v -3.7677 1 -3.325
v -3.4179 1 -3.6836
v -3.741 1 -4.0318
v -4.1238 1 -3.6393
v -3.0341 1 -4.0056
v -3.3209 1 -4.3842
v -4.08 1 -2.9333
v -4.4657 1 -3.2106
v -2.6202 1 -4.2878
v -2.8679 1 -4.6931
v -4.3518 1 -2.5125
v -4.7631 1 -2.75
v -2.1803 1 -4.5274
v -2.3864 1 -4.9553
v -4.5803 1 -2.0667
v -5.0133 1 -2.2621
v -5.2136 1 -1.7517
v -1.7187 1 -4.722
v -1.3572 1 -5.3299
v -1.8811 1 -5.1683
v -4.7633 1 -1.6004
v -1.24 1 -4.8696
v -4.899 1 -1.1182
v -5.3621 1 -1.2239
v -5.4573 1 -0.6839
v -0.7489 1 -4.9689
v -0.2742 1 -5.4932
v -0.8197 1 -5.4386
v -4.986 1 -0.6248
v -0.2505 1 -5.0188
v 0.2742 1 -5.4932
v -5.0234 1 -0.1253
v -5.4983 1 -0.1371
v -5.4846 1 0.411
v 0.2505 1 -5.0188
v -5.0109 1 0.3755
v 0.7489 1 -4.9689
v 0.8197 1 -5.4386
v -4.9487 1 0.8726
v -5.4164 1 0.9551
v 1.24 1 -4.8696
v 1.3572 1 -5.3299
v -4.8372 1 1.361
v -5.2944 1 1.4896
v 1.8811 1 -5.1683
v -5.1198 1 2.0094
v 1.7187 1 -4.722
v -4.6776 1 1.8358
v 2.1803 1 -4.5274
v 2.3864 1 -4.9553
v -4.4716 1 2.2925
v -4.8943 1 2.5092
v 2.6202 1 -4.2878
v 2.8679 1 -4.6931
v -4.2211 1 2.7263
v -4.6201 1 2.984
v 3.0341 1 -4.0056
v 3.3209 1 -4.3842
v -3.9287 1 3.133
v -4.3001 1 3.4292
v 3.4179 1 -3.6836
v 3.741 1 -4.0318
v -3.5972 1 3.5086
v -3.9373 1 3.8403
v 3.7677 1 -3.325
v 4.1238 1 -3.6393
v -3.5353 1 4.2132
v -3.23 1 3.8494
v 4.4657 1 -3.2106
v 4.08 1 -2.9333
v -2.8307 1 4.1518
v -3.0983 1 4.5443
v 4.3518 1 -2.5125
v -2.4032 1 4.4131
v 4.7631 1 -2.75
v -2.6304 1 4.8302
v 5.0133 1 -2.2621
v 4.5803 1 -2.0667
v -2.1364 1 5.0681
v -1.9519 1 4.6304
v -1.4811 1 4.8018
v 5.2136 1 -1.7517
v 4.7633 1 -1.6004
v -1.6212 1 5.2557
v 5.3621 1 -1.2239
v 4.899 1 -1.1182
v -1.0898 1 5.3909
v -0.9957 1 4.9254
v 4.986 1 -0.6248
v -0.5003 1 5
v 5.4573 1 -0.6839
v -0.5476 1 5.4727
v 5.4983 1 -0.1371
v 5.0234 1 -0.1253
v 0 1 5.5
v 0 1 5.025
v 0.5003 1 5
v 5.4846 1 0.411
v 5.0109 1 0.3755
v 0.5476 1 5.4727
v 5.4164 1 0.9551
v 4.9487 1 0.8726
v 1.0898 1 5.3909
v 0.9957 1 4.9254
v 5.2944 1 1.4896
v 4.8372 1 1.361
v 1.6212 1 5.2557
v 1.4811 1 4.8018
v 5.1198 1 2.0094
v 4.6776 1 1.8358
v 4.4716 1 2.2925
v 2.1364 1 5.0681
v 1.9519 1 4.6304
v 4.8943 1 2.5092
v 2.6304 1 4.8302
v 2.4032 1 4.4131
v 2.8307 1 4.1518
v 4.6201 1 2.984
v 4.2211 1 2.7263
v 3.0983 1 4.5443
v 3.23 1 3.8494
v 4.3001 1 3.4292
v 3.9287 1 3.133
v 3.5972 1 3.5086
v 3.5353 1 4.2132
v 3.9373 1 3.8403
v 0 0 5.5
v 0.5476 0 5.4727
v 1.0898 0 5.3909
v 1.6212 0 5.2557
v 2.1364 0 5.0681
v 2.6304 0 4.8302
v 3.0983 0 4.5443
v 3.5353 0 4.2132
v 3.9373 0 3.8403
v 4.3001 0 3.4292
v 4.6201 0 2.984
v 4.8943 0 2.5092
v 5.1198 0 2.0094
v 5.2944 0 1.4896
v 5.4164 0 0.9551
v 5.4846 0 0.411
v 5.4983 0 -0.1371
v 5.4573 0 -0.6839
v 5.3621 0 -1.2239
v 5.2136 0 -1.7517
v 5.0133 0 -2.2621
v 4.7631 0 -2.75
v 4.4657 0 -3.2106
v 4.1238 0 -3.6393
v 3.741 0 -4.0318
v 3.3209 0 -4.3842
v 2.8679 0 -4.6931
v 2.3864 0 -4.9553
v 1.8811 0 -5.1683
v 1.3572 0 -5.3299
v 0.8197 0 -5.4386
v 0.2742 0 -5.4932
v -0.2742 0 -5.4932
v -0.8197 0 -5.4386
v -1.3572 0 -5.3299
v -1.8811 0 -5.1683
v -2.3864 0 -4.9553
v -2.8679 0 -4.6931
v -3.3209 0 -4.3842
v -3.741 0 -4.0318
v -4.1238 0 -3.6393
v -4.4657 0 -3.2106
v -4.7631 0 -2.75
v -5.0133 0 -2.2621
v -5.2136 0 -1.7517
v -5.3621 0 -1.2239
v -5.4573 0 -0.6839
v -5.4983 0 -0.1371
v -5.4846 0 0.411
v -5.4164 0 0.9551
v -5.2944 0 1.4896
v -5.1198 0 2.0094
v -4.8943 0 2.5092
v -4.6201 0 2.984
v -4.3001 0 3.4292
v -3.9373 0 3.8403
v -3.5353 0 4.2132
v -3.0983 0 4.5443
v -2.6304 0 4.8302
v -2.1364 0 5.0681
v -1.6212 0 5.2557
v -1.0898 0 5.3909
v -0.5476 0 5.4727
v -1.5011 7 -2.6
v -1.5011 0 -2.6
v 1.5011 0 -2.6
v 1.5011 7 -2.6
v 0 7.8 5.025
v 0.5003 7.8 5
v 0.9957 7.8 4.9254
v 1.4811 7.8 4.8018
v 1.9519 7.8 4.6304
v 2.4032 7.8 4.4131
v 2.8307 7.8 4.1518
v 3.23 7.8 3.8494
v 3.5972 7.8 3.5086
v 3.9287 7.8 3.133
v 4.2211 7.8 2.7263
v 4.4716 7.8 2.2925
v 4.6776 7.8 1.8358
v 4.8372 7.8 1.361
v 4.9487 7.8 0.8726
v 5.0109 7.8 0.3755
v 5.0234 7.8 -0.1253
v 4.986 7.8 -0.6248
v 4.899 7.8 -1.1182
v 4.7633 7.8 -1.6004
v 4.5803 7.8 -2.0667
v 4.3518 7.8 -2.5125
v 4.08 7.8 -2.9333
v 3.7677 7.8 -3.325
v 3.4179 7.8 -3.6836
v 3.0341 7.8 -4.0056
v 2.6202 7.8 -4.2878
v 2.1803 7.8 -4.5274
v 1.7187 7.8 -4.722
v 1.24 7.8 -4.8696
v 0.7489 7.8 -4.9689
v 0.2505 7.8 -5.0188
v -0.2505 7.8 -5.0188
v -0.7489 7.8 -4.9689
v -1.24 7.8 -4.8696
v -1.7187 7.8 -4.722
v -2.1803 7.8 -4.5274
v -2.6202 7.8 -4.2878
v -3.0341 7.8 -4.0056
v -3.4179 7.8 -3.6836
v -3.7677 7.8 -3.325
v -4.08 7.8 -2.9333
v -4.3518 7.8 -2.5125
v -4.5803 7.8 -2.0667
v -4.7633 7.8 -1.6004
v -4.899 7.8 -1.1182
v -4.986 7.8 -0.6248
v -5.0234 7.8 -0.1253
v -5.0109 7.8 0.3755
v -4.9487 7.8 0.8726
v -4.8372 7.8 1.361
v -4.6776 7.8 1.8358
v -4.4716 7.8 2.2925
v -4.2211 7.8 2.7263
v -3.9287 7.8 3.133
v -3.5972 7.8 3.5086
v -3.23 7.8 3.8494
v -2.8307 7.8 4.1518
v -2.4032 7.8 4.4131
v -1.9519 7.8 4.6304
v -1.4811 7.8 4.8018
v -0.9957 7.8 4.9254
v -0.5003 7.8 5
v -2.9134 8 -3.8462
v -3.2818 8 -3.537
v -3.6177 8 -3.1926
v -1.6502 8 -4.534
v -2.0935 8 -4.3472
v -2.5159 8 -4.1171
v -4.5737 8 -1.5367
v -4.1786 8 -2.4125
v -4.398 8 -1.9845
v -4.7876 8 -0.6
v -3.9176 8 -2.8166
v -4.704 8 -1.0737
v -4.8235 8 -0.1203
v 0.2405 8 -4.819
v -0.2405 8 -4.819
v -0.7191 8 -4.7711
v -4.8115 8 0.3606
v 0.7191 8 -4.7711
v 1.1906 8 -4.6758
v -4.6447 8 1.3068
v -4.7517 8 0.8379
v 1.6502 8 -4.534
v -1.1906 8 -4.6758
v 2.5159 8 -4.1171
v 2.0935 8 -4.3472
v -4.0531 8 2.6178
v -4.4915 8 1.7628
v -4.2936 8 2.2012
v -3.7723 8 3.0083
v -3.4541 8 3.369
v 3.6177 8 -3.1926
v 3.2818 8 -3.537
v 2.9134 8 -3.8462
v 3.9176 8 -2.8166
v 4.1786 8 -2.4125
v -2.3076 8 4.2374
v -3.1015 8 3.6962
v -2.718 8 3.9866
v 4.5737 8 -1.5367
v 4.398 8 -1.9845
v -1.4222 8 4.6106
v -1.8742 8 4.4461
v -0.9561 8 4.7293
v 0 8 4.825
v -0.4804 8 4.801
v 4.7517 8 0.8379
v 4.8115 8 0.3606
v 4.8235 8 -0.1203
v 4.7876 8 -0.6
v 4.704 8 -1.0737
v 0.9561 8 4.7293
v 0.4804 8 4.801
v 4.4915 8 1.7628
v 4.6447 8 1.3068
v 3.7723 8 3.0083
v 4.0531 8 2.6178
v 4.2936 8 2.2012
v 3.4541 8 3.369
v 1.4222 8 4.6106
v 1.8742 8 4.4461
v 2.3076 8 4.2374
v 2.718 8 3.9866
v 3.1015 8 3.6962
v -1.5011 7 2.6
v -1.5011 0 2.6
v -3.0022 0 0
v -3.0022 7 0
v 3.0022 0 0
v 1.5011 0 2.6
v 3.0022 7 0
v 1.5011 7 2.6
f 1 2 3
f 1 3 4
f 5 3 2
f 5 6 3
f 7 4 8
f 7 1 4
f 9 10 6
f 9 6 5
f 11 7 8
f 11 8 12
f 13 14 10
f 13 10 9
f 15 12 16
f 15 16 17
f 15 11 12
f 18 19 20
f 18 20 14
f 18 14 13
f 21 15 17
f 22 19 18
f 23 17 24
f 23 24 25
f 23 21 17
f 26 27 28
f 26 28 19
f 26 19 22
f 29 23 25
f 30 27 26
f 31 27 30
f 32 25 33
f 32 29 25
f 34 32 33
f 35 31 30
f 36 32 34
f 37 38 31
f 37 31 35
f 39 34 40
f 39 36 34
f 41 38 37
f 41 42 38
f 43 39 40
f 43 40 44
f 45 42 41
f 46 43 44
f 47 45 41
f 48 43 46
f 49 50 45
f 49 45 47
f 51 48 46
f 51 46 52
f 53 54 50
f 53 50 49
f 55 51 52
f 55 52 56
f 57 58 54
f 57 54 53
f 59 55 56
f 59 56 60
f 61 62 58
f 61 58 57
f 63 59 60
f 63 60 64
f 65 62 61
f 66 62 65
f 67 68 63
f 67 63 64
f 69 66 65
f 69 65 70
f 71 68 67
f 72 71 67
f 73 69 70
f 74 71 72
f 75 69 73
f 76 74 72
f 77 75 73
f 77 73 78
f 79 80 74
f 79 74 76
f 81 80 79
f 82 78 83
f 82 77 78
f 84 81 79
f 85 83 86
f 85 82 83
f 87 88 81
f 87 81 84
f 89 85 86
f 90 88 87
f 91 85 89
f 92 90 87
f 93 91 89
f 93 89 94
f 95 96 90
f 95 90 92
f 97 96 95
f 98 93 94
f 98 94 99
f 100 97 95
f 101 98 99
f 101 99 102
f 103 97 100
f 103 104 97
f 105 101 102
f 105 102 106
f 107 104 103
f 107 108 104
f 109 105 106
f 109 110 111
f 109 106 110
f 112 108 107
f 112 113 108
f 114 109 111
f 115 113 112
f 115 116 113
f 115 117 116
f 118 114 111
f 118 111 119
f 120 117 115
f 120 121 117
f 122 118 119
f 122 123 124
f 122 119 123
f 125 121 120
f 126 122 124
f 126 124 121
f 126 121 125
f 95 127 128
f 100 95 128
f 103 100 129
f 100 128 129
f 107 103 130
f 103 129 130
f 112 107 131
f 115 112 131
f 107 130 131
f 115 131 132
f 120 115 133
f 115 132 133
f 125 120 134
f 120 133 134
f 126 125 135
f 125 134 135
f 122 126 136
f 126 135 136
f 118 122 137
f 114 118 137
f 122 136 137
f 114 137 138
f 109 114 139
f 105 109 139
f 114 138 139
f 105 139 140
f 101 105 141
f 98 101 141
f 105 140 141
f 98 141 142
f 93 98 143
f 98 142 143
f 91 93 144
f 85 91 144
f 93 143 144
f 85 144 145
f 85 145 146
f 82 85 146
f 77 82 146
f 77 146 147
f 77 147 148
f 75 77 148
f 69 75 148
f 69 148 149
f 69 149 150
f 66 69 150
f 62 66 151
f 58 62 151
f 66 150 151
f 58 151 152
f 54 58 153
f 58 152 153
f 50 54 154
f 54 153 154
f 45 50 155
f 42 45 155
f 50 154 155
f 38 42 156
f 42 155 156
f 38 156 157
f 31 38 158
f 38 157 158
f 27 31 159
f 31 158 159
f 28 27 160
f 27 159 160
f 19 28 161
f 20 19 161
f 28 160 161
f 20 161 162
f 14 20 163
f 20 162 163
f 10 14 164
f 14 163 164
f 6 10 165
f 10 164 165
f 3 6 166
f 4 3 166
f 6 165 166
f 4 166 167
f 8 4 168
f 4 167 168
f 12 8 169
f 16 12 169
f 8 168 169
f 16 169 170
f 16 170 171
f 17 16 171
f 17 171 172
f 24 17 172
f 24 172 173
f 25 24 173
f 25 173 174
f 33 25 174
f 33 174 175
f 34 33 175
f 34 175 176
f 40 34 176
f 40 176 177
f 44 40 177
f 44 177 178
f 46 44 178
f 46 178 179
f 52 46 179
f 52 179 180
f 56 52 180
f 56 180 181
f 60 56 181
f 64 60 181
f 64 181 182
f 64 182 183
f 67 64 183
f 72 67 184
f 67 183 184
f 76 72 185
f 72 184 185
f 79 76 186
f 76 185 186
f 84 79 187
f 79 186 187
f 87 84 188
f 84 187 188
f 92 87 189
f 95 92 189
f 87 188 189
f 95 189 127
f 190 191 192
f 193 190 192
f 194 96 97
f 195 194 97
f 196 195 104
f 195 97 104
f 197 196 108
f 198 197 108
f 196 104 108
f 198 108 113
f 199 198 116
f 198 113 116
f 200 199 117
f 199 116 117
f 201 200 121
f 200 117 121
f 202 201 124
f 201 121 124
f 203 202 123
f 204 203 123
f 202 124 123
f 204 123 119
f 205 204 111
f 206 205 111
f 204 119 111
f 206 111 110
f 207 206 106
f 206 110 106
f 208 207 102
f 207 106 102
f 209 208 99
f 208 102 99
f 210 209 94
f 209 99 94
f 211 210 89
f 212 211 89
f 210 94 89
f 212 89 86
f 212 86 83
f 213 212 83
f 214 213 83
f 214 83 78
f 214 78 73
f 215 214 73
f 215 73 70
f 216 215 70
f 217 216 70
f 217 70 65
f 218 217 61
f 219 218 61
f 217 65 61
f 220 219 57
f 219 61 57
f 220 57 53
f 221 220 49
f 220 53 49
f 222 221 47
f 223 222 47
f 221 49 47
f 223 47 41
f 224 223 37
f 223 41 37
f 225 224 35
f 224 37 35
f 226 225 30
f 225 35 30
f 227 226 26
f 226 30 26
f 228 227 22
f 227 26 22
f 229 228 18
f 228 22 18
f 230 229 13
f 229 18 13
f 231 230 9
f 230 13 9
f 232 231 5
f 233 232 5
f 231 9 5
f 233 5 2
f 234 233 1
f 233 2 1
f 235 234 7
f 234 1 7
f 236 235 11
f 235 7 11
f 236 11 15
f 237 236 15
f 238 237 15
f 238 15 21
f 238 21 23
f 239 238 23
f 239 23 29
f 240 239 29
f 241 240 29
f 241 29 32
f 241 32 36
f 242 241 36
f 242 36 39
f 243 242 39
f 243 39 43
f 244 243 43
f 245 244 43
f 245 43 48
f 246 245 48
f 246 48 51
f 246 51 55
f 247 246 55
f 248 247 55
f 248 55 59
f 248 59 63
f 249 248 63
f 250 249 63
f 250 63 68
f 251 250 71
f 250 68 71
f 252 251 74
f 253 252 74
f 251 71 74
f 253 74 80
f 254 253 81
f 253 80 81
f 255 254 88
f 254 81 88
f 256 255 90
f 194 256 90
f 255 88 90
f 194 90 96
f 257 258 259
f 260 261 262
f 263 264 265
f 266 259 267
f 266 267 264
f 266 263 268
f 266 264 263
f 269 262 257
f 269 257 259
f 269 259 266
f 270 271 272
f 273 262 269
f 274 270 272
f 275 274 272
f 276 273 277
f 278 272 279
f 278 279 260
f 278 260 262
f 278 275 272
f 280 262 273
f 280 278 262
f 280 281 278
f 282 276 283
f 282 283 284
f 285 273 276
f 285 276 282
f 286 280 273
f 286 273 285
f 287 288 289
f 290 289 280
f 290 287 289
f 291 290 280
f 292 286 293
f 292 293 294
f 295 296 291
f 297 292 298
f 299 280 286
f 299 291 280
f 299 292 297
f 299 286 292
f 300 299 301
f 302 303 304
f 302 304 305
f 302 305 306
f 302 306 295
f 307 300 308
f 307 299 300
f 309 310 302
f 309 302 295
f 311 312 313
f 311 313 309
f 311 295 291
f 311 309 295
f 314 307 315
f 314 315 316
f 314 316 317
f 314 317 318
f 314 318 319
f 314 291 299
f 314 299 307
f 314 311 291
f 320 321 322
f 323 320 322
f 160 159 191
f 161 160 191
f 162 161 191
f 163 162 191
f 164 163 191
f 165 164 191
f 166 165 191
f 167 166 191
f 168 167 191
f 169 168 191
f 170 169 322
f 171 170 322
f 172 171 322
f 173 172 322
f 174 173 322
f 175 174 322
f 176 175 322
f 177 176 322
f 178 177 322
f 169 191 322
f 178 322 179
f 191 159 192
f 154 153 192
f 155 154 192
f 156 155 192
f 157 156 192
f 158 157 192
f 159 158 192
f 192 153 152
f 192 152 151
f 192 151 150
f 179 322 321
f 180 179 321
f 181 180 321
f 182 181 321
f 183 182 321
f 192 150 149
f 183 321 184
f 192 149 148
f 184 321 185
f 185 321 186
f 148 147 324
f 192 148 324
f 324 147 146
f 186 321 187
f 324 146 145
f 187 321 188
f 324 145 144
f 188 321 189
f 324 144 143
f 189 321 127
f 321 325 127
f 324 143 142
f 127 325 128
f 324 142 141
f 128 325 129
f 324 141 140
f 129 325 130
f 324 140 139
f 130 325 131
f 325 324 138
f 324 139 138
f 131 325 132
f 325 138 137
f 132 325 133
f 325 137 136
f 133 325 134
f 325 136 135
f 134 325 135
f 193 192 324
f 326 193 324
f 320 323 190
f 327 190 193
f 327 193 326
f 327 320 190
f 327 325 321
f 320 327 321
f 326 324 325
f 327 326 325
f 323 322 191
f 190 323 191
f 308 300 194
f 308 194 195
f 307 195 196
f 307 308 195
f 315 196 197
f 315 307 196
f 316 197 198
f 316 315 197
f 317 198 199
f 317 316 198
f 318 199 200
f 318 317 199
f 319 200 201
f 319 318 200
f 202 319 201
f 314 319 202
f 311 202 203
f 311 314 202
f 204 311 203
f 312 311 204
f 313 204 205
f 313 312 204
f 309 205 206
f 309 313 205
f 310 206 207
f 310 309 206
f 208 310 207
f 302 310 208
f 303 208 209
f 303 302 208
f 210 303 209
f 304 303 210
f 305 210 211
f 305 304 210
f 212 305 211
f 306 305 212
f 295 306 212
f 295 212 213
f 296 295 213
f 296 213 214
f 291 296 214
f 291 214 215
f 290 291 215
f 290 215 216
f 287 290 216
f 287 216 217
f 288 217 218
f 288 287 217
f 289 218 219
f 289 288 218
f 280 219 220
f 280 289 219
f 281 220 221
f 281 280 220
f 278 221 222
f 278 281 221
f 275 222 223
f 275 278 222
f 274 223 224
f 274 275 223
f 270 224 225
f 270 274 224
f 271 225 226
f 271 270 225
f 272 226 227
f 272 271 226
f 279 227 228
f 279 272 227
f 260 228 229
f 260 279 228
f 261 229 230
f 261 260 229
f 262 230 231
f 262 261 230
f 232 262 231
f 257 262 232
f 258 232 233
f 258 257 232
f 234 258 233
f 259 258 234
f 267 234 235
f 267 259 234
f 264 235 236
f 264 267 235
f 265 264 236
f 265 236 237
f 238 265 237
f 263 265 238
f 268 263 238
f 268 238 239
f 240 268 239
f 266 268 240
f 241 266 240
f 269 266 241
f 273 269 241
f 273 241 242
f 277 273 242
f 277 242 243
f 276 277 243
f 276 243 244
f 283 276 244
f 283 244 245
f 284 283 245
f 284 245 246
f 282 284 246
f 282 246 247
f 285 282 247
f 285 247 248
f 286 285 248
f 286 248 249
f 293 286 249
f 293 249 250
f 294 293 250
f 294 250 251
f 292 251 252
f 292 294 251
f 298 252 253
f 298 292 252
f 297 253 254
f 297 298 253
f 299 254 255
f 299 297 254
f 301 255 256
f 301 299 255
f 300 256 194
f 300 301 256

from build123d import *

# Parameters (mm, degrees)
SKETCH1_R           = 5.5
BOSS_EXTRUDE1_DEPTH = 1
SKETCH2_R           = 5.025
BOSS_EXTRUDE2_DEPTH = 7
CUT_EXTRUDE1_DEPTH  = 7
CHAMFER1_SIZE       = 0.2


with BuildPart() as part:
    # Sketch1 → Boss-Extrude1 (new body)
    with BuildSketch(Plane(origin=(0, 0, 0), x_dir=(1, 0, 0), z_dir=(0, 1, 0))):
        with Locations(Location((0, 0, 0), (0, 0, 270))):
            Circle(SKETCH1_R)
    extrude(amount=BOSS_EXTRUDE1_DEPTH)

    # Sketch2 → Boss-Extrude2 (add)
    with BuildSketch(Plane(origin=(0, 1, 0), x_dir=(1, 0, 0), z_dir=(0, 1, 0))):
        with Locations(Location((0, 0, 0), (0, 0, 270))):
            Circle(SKETCH2_R)
    extrude(amount=BOSS_EXTRUDE2_DEPTH)

    # Sketch3 → Cut-Extrude1 (cut)
    with BuildSketch(Plane.XZ):
        Polygon((3.0022214, 0), (1.5011107, 2.6), (-1.5011107, 2.6), (-3.0022214, 0), (-1.5011107, -2.6), (1.5011107, -2.6), align=None)
    extrude(amount=-CUT_EXTRUDE1_DEPTH, mode=Mode.SUBTRACT)

    # Chamfer1
    chamfer1_edges = [part.edges().sort_by_distance(p)[0] for p in [
        (0, 8, -5.025),
    ]]
    chamfer(chamfer1_edges, length=CHAMFER1_SIZE)


solid = part.part
